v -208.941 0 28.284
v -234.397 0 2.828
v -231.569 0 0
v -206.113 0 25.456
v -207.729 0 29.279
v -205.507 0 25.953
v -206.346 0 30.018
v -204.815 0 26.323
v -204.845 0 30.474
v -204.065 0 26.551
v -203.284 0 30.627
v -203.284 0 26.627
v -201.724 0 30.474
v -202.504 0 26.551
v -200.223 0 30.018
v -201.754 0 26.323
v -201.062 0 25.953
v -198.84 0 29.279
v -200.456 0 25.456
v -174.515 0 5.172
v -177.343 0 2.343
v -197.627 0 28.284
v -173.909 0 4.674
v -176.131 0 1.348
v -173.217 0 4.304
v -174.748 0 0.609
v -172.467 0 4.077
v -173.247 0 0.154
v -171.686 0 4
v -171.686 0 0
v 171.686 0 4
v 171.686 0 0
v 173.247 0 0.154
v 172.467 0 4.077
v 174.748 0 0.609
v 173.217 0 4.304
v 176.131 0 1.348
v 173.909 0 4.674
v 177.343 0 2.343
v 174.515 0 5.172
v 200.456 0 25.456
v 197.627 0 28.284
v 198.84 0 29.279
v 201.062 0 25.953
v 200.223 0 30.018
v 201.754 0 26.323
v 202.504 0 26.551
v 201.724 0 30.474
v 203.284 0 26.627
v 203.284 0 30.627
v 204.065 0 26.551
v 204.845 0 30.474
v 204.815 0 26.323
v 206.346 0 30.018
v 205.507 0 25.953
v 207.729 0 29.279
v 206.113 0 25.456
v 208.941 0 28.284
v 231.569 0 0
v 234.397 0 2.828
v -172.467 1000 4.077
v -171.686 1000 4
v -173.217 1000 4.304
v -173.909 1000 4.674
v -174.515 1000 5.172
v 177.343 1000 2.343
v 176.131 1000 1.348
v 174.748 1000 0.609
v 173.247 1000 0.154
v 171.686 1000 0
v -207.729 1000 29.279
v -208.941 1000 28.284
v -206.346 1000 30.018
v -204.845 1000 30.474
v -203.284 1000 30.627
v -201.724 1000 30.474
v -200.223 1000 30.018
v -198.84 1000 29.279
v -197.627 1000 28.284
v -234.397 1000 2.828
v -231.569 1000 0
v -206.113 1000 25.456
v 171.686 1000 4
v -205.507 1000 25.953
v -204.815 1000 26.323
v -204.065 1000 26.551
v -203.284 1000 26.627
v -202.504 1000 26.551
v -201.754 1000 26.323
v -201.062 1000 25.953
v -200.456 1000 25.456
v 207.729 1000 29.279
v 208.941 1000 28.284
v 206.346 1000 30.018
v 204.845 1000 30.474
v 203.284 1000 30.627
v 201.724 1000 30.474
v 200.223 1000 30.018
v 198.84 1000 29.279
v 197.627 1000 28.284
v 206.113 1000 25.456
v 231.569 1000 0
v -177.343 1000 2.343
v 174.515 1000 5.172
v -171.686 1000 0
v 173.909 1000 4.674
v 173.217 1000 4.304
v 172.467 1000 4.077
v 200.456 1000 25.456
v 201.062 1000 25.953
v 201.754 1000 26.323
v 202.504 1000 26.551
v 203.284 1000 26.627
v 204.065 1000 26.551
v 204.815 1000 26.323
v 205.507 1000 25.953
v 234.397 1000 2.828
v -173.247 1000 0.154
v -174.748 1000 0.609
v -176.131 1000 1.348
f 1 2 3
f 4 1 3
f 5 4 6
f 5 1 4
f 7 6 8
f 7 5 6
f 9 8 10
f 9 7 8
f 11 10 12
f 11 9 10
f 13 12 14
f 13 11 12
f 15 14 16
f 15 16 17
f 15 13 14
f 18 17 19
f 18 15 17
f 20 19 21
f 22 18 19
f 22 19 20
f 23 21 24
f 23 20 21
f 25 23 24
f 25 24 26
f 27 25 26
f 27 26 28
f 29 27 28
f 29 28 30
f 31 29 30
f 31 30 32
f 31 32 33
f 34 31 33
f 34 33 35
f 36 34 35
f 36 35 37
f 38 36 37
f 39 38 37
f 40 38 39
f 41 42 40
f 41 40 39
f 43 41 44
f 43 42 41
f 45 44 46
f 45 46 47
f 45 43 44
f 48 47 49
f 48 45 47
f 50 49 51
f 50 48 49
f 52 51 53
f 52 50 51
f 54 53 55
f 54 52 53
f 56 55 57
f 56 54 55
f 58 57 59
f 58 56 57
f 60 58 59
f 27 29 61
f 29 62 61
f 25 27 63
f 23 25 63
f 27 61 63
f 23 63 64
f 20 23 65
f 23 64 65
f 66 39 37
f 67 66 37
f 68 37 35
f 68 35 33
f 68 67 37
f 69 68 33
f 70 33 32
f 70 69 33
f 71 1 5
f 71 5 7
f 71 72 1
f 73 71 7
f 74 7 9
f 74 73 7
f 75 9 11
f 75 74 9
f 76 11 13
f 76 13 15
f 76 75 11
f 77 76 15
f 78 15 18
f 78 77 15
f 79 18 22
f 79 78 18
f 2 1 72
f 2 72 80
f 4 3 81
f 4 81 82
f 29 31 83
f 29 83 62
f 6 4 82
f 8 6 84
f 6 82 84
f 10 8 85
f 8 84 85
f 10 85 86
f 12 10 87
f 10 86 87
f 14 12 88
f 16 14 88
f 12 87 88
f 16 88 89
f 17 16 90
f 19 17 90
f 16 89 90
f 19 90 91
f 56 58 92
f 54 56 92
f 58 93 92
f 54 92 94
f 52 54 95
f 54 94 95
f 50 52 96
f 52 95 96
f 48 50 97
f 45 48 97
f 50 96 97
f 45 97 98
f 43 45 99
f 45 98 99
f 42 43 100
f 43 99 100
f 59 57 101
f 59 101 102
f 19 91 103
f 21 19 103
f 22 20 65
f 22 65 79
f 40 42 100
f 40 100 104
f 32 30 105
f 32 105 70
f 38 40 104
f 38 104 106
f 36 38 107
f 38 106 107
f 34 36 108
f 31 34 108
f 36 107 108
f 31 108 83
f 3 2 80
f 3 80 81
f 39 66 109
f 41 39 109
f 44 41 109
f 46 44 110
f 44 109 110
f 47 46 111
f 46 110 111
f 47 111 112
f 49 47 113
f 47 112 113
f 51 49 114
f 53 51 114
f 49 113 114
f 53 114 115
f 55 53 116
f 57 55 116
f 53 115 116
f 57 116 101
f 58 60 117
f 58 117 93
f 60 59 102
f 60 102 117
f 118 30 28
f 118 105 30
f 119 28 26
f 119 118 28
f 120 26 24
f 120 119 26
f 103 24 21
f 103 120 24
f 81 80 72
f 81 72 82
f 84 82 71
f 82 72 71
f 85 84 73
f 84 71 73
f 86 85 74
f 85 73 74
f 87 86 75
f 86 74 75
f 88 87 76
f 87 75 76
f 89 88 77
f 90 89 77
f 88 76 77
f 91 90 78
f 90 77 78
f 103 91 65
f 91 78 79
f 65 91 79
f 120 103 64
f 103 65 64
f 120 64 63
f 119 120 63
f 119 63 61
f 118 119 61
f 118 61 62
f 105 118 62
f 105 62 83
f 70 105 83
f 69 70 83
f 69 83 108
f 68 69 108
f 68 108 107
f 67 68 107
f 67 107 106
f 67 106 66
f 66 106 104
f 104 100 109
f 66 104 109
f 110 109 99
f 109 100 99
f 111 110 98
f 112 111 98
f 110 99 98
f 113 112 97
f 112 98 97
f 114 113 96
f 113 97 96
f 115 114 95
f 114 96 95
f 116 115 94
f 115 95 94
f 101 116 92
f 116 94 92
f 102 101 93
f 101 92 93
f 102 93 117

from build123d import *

# Parameters (mm, degrees)
F1_DEPTH = 1000
F2_R     = 4
F3_R     = 8


with BuildPart() as f1:
    # F0 (on Front) → F1 (new body)
    with BuildSketch(Plane.XZ):
        Polygon((-175, 0), (0, 0), (175, 0), (203.284271, 28.284271), (231.568542, 0), (234.39697, 2.828427), (203.284271, 33.941125), (173.343146, 4), (0, 4), (-173.343146, 4), (-203.284271, 33.941125), (-234.39697, 2.828427), (-231.568542, 0), (-203.284271, 28.284271), align=None)
    extrude(amount=-F1_DEPTH)

    # F2
    f2_edges = [f1.edges().sort_by_distance(p)[0] for p in [
        (-203.284271, 500, 28.284271),
        (203.284271, 500, 28.284271),
        (-173.343146, 500, 4),
        (173.343146, 500, 4),
    ]]
    fillet(f2_edges, radius=F2_R)

    # F3
    f3_edges = [f1.edges().sort_by_distance(p)[0] for p in [
        (-203.284271, 500, 33.941125),
        (203.284271, 500, 33.941125),
        (-175, 500, 0),
        (175, 500, 0),
    ]]
    fillet(f3_edges, radius=F3_R)


solid = f1.part
